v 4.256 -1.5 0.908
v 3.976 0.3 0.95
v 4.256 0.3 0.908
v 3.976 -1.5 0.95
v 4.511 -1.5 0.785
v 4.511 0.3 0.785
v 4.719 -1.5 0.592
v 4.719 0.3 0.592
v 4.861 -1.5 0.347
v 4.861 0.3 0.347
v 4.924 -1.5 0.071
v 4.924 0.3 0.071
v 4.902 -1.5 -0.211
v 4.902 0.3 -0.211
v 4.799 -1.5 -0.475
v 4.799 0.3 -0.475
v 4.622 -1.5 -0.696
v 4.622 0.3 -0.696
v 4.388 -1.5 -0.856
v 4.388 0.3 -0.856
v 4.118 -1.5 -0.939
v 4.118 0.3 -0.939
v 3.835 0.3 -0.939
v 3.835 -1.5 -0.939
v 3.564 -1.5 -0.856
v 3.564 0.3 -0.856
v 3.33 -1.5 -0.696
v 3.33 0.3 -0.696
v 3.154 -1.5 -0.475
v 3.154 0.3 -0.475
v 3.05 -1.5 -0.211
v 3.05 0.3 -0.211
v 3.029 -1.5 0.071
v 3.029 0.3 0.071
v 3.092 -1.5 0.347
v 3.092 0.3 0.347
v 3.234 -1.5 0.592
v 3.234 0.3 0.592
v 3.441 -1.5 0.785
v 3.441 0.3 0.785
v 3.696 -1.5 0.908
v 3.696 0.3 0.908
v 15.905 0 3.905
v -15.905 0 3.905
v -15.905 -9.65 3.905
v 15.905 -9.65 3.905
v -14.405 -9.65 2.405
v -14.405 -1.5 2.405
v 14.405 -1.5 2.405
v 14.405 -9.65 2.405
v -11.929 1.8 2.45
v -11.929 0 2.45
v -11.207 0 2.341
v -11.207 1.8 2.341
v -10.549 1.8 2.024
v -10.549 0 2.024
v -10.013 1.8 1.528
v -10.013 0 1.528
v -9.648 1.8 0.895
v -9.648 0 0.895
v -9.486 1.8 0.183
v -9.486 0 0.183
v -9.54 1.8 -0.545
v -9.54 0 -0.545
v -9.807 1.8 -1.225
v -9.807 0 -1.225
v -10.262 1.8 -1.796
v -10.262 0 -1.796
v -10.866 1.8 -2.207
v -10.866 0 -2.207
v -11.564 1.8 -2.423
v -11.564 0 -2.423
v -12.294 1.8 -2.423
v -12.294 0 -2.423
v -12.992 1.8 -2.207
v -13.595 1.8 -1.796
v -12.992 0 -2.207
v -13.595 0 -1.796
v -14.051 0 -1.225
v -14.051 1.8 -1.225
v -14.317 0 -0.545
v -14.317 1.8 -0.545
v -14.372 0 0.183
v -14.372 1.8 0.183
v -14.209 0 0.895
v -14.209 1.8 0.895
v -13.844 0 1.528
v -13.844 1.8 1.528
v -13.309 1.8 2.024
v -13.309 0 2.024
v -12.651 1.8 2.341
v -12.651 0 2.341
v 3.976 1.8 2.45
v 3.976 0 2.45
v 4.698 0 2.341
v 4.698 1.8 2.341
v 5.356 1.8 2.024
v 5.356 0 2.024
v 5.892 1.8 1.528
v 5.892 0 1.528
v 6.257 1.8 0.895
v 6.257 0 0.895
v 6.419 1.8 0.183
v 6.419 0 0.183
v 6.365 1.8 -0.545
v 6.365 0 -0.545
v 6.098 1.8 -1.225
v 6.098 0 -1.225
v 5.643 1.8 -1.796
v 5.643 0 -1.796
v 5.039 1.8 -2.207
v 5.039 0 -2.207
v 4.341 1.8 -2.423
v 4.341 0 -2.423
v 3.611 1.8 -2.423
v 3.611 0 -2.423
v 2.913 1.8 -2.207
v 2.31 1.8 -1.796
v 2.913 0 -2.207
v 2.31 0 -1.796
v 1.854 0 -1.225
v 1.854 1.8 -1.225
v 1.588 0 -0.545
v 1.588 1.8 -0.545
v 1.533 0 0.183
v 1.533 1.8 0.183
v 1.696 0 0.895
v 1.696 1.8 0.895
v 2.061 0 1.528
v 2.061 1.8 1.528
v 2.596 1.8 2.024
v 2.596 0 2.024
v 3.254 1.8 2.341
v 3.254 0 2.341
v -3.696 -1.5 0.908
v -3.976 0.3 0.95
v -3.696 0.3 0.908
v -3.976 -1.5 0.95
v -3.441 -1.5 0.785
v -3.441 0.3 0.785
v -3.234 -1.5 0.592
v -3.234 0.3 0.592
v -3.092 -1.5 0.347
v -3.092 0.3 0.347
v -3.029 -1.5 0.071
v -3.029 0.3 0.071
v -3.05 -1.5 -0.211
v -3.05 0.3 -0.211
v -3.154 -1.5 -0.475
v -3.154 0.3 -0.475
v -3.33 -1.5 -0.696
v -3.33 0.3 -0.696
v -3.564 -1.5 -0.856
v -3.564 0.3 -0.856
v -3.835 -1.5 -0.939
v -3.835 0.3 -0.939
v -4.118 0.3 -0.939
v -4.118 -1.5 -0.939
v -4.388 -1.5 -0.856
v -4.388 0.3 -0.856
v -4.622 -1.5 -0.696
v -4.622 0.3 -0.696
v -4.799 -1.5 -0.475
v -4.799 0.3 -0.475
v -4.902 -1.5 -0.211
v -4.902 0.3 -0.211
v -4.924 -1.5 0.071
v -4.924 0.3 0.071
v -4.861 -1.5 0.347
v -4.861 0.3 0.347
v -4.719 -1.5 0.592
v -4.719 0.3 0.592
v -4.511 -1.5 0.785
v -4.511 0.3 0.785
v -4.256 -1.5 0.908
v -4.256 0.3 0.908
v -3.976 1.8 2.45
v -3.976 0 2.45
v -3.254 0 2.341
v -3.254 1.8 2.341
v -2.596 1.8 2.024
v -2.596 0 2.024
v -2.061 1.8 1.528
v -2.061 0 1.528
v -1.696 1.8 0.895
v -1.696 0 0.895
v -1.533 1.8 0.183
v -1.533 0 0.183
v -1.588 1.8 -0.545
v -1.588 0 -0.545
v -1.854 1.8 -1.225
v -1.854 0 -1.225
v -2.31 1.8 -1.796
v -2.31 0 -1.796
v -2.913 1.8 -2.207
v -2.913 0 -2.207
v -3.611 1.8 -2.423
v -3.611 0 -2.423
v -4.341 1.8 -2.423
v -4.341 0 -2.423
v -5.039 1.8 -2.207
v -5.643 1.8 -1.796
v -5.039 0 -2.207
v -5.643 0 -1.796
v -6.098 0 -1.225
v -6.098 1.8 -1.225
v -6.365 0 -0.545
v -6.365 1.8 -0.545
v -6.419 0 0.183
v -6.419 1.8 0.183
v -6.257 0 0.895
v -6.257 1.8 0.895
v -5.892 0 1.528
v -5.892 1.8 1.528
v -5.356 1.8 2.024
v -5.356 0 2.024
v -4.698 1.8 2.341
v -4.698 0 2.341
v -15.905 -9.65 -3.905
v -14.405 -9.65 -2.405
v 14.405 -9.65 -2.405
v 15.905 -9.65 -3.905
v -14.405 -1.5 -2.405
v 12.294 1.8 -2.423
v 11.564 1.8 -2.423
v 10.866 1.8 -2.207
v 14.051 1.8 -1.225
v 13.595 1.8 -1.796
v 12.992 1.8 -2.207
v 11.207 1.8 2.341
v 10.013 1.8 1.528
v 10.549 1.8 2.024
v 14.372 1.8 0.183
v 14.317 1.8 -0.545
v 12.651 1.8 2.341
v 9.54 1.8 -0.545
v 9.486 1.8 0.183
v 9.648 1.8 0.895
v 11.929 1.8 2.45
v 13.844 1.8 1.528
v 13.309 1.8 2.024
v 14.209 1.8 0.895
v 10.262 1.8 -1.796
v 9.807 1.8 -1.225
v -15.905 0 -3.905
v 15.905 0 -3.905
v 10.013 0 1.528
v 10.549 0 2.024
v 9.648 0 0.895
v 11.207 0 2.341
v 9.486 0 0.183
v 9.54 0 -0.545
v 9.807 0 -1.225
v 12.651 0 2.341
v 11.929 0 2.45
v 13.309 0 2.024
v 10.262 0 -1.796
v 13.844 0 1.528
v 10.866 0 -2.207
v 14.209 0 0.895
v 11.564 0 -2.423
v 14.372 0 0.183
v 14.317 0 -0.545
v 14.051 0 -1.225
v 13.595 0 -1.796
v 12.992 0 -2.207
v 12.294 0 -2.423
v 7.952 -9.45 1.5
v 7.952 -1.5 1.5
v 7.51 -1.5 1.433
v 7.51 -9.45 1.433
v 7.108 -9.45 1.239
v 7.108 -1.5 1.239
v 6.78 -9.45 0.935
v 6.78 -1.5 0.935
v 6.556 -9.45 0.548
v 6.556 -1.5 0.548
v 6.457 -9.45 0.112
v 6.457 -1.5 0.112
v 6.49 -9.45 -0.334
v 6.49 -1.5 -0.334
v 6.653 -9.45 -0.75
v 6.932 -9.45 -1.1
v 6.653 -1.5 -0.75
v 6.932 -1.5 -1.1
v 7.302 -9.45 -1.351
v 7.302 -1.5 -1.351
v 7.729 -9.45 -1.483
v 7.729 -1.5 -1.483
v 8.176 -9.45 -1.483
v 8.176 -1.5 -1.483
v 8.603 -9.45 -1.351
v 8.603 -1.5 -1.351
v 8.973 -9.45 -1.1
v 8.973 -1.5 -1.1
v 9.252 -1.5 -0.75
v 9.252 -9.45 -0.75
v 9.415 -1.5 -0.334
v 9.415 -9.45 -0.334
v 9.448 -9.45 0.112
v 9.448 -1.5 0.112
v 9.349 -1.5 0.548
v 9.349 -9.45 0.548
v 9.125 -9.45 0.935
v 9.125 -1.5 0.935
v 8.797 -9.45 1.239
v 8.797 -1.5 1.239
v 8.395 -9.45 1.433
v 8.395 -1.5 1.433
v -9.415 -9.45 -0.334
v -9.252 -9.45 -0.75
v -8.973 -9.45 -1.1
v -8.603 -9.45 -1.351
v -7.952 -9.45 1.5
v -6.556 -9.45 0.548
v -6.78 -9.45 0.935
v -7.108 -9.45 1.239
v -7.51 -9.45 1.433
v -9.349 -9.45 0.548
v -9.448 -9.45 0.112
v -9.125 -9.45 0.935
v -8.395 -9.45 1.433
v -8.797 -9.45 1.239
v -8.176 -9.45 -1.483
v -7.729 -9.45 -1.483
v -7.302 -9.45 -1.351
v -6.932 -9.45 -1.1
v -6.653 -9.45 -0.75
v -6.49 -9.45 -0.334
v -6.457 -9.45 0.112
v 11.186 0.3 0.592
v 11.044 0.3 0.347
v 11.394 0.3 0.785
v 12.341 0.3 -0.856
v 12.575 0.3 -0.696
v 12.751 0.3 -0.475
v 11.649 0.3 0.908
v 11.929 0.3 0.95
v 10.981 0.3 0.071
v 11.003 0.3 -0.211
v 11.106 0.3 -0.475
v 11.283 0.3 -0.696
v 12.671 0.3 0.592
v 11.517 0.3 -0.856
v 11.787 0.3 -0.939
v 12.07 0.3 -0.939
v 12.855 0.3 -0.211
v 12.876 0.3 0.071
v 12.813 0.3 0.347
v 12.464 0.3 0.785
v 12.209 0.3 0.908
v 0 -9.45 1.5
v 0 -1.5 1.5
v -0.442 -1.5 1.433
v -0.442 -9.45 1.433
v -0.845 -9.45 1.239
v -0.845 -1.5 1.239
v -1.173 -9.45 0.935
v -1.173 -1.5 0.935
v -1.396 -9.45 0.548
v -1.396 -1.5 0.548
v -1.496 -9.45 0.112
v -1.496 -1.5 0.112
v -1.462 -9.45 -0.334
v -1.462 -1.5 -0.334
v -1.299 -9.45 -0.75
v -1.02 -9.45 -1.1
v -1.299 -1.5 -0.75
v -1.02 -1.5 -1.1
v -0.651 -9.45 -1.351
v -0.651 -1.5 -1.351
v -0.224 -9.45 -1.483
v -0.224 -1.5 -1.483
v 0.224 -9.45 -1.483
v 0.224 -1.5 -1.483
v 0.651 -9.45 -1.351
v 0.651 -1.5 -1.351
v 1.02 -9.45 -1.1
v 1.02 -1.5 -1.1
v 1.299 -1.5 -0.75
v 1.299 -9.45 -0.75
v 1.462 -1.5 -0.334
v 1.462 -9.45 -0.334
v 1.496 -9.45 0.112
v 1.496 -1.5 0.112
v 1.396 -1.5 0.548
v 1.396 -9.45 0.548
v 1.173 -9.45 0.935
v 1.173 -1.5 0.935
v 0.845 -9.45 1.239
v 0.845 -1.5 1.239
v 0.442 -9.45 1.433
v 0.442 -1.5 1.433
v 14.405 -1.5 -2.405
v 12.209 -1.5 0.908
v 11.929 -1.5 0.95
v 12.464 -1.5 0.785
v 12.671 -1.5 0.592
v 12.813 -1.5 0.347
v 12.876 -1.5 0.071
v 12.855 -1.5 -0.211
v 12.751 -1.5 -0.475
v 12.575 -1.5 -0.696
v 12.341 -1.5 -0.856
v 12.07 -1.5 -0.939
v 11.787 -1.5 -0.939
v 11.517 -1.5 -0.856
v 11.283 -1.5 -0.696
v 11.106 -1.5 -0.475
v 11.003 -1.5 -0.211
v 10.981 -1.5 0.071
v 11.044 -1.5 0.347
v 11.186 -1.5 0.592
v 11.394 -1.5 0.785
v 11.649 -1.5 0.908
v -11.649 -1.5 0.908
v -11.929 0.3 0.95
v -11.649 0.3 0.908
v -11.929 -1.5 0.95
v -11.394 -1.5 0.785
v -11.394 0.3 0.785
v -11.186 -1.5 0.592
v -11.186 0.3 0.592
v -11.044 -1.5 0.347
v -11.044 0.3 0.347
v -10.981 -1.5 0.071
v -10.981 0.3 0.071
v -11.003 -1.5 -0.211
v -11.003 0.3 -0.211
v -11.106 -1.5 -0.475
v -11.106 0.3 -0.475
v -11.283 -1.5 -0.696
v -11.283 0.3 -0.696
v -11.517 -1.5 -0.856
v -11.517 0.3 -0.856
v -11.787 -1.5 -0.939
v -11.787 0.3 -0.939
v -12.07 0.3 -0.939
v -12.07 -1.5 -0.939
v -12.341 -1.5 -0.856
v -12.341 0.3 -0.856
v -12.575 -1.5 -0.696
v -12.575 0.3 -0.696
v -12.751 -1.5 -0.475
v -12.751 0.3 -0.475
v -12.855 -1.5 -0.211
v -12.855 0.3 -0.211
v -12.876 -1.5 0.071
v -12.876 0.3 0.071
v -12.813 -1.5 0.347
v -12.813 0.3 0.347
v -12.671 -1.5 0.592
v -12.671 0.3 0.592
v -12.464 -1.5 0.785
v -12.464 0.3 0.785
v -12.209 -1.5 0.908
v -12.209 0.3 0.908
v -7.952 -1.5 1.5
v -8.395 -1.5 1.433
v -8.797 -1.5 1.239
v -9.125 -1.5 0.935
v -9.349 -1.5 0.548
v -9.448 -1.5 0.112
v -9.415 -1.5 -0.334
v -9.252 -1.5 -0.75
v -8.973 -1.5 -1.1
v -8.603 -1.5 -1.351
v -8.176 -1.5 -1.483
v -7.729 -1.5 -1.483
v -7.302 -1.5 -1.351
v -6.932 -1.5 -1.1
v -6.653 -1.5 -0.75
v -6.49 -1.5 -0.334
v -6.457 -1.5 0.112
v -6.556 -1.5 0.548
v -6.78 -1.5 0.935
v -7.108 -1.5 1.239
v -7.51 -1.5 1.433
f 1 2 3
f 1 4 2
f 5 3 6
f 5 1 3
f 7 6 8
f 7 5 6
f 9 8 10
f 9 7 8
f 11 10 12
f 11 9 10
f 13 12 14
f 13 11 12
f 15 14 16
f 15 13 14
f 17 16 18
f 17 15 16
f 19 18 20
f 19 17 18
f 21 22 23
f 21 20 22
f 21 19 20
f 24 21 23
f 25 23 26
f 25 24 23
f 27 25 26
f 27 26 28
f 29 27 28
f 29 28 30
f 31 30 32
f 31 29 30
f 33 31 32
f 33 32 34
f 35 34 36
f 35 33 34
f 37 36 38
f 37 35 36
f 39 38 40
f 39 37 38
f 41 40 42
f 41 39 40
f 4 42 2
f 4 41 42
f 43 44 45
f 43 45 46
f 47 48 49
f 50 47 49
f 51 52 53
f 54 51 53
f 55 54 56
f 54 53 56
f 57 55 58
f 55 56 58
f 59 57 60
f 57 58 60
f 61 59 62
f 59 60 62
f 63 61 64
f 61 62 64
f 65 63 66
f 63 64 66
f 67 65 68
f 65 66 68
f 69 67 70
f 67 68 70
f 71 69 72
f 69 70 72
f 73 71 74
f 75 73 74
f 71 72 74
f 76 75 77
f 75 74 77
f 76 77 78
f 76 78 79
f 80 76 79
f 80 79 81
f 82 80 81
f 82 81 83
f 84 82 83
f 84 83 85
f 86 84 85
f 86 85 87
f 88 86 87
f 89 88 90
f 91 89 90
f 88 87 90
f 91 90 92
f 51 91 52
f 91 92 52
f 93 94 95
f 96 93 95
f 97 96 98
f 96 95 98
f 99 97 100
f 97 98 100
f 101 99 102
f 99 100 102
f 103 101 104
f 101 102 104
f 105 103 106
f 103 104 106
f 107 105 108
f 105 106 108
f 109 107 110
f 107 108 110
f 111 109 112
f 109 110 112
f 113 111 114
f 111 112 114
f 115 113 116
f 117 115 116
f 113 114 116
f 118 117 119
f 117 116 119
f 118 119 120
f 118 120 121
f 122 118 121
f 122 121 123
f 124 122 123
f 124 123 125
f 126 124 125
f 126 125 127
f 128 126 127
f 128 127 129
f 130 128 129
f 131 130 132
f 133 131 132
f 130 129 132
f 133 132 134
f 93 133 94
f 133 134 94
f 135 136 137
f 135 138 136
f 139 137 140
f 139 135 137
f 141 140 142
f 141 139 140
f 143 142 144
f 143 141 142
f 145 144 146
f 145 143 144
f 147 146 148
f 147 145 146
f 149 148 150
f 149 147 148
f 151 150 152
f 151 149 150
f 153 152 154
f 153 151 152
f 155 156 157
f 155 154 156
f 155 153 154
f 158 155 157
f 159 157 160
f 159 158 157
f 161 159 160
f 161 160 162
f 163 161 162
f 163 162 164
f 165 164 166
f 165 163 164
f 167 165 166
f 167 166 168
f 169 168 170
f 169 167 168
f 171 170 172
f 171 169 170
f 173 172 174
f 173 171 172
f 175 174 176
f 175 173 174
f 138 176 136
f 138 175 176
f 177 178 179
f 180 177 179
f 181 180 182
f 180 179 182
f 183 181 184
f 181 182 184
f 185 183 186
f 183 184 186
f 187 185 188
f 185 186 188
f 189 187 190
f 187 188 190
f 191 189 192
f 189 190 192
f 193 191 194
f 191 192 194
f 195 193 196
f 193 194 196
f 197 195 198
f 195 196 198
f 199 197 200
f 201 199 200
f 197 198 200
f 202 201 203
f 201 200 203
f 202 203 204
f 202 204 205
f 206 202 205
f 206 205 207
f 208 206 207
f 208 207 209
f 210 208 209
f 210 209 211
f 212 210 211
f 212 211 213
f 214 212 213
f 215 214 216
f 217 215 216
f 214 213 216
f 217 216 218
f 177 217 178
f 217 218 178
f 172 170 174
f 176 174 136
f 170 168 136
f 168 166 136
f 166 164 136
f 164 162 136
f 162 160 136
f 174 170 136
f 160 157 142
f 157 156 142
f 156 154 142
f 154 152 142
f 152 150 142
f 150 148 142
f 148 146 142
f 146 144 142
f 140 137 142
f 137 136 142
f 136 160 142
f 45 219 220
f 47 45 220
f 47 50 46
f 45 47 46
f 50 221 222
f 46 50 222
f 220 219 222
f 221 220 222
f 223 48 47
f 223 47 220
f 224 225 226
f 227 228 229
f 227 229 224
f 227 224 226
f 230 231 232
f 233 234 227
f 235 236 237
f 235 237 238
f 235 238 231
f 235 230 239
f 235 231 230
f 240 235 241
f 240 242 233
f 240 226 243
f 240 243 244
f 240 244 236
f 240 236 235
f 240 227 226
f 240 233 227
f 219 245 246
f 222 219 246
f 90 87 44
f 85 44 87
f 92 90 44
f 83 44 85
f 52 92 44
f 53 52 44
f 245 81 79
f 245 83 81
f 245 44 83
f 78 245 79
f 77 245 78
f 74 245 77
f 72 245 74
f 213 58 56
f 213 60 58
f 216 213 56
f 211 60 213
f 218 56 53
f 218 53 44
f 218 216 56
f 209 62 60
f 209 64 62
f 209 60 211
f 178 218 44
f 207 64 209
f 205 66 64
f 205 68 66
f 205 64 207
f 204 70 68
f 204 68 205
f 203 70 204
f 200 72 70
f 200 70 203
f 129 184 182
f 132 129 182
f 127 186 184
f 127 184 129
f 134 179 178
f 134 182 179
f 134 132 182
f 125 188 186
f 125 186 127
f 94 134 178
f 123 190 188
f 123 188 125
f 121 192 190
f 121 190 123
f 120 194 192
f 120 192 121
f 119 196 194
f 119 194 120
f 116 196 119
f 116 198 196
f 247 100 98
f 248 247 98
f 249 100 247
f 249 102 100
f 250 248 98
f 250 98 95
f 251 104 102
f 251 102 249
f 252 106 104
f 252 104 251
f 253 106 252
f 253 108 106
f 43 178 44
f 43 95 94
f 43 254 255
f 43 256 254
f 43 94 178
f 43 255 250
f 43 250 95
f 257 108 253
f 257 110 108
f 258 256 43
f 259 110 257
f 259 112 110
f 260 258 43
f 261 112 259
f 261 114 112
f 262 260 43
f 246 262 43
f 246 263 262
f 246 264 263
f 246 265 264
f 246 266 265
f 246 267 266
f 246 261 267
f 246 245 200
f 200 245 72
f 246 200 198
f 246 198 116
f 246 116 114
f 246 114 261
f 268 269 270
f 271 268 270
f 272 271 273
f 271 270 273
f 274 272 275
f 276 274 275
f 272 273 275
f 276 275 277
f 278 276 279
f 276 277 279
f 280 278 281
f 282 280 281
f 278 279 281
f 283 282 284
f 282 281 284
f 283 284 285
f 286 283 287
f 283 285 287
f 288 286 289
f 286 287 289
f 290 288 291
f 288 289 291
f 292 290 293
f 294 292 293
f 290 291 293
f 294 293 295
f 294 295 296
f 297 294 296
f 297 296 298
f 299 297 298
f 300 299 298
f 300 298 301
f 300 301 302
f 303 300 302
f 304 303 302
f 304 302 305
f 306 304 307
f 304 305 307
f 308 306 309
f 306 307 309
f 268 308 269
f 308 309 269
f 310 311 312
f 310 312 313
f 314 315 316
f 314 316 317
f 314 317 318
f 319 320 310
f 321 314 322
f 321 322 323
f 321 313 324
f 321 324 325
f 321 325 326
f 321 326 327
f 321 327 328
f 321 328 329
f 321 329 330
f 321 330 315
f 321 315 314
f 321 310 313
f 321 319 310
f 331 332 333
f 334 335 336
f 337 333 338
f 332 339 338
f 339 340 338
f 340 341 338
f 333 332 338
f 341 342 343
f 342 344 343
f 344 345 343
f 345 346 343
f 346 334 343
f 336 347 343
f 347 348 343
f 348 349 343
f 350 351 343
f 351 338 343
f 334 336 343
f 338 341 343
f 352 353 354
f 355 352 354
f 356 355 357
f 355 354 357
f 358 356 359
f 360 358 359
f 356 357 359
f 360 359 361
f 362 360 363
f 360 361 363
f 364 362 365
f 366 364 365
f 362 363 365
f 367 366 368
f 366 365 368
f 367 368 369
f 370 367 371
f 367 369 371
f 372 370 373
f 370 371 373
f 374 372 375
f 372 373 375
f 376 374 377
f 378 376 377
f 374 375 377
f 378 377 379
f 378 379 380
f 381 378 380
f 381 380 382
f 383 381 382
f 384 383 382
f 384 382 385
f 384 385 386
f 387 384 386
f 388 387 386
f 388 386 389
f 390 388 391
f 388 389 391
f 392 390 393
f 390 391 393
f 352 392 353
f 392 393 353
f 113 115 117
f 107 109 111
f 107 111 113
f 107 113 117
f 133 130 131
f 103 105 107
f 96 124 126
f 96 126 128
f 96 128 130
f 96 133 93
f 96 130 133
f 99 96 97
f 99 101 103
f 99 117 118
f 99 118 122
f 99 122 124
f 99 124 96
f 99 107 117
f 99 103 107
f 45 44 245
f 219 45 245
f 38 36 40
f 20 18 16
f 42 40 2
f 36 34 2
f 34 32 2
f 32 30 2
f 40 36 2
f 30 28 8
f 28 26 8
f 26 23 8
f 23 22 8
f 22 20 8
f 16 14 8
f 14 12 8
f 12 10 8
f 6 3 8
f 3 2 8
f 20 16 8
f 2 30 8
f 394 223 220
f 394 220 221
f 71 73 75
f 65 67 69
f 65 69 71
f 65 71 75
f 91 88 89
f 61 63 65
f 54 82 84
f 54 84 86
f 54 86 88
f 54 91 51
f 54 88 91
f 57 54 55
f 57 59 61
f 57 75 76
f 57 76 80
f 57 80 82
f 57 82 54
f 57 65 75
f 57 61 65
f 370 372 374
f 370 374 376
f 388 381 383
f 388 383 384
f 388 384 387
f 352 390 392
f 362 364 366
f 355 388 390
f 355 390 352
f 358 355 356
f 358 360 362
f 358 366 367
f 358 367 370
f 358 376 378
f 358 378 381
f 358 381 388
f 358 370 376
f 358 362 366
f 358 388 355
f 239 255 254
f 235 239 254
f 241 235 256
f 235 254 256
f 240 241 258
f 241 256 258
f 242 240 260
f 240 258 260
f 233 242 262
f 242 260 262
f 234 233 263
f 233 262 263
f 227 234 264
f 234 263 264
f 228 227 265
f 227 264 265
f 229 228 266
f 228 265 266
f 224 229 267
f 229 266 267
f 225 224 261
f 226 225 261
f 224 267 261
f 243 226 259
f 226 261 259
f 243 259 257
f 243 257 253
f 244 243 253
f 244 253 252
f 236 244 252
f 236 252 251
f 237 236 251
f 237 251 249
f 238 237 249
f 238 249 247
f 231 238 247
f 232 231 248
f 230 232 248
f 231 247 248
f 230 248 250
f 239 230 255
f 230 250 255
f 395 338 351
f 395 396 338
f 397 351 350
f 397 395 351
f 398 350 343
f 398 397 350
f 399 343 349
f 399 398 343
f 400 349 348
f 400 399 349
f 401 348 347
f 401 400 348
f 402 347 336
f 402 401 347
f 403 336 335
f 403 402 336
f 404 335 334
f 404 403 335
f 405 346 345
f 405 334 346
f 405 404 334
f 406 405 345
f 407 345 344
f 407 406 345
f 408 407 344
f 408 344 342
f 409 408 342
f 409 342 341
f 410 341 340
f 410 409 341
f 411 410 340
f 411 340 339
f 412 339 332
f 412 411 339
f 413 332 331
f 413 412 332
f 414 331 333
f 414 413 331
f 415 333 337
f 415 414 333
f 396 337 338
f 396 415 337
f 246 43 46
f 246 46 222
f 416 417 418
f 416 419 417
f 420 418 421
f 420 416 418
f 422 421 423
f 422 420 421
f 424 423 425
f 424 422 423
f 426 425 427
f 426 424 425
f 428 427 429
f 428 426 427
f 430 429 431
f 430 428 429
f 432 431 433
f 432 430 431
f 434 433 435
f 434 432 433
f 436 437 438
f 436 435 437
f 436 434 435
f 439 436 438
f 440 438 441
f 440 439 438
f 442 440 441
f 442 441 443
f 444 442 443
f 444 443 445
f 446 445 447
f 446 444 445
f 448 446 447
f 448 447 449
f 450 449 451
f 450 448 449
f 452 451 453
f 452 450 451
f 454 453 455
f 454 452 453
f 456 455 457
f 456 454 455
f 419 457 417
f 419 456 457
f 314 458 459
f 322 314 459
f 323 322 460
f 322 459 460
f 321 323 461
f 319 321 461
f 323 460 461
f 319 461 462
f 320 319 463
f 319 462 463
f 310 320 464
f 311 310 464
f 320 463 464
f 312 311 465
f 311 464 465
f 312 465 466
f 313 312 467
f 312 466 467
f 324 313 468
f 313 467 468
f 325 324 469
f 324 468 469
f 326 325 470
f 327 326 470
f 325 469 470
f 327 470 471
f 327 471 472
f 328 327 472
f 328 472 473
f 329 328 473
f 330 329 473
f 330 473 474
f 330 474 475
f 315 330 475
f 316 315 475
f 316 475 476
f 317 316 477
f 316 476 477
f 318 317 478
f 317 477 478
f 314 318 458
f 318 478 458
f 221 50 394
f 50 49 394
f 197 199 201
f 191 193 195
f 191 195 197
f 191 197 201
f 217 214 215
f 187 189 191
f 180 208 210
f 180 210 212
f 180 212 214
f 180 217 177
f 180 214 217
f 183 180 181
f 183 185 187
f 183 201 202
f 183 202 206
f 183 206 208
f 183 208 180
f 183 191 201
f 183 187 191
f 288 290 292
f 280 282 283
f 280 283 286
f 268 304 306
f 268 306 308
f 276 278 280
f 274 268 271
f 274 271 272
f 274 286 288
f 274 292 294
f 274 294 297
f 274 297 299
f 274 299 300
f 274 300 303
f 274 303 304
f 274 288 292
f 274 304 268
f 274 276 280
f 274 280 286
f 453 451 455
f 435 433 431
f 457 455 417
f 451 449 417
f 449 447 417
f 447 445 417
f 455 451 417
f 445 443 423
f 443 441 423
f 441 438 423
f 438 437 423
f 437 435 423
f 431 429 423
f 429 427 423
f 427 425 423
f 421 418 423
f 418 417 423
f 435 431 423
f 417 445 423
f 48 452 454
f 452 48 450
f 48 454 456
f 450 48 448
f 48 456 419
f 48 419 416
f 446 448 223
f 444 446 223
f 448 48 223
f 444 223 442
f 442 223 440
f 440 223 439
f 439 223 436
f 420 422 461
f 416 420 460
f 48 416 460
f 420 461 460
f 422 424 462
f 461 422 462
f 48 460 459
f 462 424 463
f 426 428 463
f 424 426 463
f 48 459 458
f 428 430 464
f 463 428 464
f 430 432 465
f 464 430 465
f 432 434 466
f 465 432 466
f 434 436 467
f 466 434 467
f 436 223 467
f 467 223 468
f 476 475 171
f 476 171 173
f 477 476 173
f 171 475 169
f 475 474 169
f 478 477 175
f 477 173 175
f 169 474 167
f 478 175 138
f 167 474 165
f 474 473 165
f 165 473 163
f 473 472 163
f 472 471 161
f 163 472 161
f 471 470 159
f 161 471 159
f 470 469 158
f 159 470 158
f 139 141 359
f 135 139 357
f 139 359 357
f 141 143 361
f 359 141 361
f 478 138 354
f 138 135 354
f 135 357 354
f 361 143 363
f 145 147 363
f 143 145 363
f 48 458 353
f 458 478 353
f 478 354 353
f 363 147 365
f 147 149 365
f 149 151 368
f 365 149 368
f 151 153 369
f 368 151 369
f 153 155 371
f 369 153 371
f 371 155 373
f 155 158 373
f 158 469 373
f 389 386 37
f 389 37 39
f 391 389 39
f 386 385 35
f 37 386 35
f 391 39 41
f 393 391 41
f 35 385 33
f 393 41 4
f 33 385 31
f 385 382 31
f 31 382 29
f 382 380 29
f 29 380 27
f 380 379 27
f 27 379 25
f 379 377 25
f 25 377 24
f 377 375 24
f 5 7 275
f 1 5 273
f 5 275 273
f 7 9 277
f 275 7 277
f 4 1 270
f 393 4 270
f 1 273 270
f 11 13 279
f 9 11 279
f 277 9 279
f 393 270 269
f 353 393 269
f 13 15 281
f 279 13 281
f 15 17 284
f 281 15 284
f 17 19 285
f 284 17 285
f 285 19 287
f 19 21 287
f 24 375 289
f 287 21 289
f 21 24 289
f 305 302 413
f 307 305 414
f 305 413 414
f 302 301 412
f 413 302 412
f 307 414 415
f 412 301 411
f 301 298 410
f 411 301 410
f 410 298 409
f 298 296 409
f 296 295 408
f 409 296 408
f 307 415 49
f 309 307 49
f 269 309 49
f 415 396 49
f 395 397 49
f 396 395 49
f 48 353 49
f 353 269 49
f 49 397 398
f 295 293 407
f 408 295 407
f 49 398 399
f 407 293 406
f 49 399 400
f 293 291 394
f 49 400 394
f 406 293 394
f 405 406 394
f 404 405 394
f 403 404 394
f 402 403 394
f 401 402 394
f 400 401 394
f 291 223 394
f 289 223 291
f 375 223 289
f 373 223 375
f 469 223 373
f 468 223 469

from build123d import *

# Parameters (mm, degrees)
SKETCH2_W           = 31.81
SKETCH2_H           = 7.81
BOSS_EXTRUDE1_DEPTH = 9.65
SKETCH3_R           = 2.45
BOSS_EXTRUDE2_DEPTH = 1.8
SHELL1_T            = -1.5
SKETCH4_R           = 1.5
BOSS_EXTRUDE3_DEPTH = 7.95


with BuildPart() as part:
    # Sketch2 → Boss-Extrude1 (new body)
    with BuildSketch(Plane(origin=(0, 0, 0), x_dir=(1, 0, 0), z_dir=(0, 1, 0))):
        Rectangle(SKETCH2_W, SKETCH2_H)
    extrude(amount=-BOSS_EXTRUDE1_DEPTH)

    # Sketch3 → Boss-Extrude2 (add)
    with BuildSketch(Plane(origin=(0, 0, 0), x_dir=(1, 0, 0), z_dir=(0, 1, 0))):
        with Locations(Location((-11.92875, 0, 0), (0, 0, 270))):
            Circle(SKETCH3_R)
        with Locations(Location((-3.97625, 0, 0), (0, 0, 270))):
            Circle(SKETCH3_R)
        with Locations(Location((3.97625, 0, 0), (0, 0, 270))):
            Circle(SKETCH3_R)
        with Locations(Location((11.92875, 0, 0), (0, 0, 270))):
            Circle(SKETCH3_R)
    extrude(amount=BOSS_EXTRUDE2_DEPTH)

    # Shell1
    shell1_openings = [part.faces().sort_by_distance(p)[0] for p in [
        (0, -9.65, 0),
    ]]
    offset(amount=SHELL1_T, openings=shell1_openings, kind=Kind.INTERSECTION)

    # Sketch4 → Boss-Extrude3 (add)
    with BuildSketch(Plane.XZ.offset(1.5)):
        with Locations(Location((-7.9525, 0, 0), (0, 0, 90))):
            Circle(SKETCH4_R)
        with Locations(Location((0, 0, 0), (0, 0, 90))):
            Circle(SKETCH4_R)
        with Locations(Location((7.9525, 0, 0), (0, 0, 90))):
            Circle(SKETCH4_R)
    extrude(amount=BOSS_EXTRUDE3_DEPTH)


solid = part.part
